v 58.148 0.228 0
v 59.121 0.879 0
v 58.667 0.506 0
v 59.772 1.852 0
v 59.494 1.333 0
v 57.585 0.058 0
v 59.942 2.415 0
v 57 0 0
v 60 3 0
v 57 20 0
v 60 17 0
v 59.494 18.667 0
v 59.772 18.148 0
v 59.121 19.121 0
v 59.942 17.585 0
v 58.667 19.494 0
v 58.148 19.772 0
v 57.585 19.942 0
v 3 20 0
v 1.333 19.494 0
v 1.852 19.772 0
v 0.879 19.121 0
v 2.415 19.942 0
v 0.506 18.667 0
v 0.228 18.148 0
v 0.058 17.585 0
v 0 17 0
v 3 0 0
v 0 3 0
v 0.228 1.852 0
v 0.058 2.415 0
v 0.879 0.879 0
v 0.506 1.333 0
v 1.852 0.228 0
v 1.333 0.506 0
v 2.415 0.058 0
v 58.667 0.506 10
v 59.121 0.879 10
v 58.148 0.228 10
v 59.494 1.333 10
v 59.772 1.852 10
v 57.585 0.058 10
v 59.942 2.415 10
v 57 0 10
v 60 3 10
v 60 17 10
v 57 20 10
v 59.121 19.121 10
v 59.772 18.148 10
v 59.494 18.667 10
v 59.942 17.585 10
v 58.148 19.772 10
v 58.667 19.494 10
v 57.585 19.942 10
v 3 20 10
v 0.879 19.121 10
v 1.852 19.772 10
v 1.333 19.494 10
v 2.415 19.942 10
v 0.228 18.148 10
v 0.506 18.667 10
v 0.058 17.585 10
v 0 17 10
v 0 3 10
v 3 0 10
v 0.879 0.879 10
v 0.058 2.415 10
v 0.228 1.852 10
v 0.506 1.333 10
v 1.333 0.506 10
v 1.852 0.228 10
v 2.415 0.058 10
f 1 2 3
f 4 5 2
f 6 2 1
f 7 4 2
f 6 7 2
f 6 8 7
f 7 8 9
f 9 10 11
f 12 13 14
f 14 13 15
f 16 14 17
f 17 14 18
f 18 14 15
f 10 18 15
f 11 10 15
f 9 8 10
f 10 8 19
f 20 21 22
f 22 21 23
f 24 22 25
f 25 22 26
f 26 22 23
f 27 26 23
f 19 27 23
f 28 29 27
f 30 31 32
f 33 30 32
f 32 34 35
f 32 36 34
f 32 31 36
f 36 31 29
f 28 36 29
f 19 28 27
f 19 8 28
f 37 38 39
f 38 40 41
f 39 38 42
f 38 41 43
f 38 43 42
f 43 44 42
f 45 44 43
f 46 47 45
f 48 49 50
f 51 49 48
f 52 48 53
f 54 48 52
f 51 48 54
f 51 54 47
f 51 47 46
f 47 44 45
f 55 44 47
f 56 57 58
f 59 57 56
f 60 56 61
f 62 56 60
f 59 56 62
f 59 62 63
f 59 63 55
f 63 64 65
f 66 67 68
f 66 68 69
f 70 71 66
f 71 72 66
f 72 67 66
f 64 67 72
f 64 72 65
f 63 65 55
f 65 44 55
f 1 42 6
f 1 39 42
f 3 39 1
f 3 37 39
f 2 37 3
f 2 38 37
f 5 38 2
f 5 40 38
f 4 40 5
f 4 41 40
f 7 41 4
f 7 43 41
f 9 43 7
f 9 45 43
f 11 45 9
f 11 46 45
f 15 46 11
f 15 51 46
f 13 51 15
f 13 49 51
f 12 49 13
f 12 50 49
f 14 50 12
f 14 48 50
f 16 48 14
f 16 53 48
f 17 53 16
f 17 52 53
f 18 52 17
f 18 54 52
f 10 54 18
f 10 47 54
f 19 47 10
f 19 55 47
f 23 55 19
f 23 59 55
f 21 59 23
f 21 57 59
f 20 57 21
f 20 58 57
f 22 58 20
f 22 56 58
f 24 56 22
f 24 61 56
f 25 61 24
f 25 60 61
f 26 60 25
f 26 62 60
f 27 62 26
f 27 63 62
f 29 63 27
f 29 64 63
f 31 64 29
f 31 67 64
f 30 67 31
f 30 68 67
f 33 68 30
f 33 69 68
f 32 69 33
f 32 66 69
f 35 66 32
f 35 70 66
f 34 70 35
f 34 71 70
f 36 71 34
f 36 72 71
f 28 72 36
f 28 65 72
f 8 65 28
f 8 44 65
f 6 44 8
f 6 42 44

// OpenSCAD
// Same 60 x 20 footprint with r=3 rounded corners.
$fn = 32;
linear_extrude(10) offset(r = 3) offset(delta = -3) square([60, 20]);
